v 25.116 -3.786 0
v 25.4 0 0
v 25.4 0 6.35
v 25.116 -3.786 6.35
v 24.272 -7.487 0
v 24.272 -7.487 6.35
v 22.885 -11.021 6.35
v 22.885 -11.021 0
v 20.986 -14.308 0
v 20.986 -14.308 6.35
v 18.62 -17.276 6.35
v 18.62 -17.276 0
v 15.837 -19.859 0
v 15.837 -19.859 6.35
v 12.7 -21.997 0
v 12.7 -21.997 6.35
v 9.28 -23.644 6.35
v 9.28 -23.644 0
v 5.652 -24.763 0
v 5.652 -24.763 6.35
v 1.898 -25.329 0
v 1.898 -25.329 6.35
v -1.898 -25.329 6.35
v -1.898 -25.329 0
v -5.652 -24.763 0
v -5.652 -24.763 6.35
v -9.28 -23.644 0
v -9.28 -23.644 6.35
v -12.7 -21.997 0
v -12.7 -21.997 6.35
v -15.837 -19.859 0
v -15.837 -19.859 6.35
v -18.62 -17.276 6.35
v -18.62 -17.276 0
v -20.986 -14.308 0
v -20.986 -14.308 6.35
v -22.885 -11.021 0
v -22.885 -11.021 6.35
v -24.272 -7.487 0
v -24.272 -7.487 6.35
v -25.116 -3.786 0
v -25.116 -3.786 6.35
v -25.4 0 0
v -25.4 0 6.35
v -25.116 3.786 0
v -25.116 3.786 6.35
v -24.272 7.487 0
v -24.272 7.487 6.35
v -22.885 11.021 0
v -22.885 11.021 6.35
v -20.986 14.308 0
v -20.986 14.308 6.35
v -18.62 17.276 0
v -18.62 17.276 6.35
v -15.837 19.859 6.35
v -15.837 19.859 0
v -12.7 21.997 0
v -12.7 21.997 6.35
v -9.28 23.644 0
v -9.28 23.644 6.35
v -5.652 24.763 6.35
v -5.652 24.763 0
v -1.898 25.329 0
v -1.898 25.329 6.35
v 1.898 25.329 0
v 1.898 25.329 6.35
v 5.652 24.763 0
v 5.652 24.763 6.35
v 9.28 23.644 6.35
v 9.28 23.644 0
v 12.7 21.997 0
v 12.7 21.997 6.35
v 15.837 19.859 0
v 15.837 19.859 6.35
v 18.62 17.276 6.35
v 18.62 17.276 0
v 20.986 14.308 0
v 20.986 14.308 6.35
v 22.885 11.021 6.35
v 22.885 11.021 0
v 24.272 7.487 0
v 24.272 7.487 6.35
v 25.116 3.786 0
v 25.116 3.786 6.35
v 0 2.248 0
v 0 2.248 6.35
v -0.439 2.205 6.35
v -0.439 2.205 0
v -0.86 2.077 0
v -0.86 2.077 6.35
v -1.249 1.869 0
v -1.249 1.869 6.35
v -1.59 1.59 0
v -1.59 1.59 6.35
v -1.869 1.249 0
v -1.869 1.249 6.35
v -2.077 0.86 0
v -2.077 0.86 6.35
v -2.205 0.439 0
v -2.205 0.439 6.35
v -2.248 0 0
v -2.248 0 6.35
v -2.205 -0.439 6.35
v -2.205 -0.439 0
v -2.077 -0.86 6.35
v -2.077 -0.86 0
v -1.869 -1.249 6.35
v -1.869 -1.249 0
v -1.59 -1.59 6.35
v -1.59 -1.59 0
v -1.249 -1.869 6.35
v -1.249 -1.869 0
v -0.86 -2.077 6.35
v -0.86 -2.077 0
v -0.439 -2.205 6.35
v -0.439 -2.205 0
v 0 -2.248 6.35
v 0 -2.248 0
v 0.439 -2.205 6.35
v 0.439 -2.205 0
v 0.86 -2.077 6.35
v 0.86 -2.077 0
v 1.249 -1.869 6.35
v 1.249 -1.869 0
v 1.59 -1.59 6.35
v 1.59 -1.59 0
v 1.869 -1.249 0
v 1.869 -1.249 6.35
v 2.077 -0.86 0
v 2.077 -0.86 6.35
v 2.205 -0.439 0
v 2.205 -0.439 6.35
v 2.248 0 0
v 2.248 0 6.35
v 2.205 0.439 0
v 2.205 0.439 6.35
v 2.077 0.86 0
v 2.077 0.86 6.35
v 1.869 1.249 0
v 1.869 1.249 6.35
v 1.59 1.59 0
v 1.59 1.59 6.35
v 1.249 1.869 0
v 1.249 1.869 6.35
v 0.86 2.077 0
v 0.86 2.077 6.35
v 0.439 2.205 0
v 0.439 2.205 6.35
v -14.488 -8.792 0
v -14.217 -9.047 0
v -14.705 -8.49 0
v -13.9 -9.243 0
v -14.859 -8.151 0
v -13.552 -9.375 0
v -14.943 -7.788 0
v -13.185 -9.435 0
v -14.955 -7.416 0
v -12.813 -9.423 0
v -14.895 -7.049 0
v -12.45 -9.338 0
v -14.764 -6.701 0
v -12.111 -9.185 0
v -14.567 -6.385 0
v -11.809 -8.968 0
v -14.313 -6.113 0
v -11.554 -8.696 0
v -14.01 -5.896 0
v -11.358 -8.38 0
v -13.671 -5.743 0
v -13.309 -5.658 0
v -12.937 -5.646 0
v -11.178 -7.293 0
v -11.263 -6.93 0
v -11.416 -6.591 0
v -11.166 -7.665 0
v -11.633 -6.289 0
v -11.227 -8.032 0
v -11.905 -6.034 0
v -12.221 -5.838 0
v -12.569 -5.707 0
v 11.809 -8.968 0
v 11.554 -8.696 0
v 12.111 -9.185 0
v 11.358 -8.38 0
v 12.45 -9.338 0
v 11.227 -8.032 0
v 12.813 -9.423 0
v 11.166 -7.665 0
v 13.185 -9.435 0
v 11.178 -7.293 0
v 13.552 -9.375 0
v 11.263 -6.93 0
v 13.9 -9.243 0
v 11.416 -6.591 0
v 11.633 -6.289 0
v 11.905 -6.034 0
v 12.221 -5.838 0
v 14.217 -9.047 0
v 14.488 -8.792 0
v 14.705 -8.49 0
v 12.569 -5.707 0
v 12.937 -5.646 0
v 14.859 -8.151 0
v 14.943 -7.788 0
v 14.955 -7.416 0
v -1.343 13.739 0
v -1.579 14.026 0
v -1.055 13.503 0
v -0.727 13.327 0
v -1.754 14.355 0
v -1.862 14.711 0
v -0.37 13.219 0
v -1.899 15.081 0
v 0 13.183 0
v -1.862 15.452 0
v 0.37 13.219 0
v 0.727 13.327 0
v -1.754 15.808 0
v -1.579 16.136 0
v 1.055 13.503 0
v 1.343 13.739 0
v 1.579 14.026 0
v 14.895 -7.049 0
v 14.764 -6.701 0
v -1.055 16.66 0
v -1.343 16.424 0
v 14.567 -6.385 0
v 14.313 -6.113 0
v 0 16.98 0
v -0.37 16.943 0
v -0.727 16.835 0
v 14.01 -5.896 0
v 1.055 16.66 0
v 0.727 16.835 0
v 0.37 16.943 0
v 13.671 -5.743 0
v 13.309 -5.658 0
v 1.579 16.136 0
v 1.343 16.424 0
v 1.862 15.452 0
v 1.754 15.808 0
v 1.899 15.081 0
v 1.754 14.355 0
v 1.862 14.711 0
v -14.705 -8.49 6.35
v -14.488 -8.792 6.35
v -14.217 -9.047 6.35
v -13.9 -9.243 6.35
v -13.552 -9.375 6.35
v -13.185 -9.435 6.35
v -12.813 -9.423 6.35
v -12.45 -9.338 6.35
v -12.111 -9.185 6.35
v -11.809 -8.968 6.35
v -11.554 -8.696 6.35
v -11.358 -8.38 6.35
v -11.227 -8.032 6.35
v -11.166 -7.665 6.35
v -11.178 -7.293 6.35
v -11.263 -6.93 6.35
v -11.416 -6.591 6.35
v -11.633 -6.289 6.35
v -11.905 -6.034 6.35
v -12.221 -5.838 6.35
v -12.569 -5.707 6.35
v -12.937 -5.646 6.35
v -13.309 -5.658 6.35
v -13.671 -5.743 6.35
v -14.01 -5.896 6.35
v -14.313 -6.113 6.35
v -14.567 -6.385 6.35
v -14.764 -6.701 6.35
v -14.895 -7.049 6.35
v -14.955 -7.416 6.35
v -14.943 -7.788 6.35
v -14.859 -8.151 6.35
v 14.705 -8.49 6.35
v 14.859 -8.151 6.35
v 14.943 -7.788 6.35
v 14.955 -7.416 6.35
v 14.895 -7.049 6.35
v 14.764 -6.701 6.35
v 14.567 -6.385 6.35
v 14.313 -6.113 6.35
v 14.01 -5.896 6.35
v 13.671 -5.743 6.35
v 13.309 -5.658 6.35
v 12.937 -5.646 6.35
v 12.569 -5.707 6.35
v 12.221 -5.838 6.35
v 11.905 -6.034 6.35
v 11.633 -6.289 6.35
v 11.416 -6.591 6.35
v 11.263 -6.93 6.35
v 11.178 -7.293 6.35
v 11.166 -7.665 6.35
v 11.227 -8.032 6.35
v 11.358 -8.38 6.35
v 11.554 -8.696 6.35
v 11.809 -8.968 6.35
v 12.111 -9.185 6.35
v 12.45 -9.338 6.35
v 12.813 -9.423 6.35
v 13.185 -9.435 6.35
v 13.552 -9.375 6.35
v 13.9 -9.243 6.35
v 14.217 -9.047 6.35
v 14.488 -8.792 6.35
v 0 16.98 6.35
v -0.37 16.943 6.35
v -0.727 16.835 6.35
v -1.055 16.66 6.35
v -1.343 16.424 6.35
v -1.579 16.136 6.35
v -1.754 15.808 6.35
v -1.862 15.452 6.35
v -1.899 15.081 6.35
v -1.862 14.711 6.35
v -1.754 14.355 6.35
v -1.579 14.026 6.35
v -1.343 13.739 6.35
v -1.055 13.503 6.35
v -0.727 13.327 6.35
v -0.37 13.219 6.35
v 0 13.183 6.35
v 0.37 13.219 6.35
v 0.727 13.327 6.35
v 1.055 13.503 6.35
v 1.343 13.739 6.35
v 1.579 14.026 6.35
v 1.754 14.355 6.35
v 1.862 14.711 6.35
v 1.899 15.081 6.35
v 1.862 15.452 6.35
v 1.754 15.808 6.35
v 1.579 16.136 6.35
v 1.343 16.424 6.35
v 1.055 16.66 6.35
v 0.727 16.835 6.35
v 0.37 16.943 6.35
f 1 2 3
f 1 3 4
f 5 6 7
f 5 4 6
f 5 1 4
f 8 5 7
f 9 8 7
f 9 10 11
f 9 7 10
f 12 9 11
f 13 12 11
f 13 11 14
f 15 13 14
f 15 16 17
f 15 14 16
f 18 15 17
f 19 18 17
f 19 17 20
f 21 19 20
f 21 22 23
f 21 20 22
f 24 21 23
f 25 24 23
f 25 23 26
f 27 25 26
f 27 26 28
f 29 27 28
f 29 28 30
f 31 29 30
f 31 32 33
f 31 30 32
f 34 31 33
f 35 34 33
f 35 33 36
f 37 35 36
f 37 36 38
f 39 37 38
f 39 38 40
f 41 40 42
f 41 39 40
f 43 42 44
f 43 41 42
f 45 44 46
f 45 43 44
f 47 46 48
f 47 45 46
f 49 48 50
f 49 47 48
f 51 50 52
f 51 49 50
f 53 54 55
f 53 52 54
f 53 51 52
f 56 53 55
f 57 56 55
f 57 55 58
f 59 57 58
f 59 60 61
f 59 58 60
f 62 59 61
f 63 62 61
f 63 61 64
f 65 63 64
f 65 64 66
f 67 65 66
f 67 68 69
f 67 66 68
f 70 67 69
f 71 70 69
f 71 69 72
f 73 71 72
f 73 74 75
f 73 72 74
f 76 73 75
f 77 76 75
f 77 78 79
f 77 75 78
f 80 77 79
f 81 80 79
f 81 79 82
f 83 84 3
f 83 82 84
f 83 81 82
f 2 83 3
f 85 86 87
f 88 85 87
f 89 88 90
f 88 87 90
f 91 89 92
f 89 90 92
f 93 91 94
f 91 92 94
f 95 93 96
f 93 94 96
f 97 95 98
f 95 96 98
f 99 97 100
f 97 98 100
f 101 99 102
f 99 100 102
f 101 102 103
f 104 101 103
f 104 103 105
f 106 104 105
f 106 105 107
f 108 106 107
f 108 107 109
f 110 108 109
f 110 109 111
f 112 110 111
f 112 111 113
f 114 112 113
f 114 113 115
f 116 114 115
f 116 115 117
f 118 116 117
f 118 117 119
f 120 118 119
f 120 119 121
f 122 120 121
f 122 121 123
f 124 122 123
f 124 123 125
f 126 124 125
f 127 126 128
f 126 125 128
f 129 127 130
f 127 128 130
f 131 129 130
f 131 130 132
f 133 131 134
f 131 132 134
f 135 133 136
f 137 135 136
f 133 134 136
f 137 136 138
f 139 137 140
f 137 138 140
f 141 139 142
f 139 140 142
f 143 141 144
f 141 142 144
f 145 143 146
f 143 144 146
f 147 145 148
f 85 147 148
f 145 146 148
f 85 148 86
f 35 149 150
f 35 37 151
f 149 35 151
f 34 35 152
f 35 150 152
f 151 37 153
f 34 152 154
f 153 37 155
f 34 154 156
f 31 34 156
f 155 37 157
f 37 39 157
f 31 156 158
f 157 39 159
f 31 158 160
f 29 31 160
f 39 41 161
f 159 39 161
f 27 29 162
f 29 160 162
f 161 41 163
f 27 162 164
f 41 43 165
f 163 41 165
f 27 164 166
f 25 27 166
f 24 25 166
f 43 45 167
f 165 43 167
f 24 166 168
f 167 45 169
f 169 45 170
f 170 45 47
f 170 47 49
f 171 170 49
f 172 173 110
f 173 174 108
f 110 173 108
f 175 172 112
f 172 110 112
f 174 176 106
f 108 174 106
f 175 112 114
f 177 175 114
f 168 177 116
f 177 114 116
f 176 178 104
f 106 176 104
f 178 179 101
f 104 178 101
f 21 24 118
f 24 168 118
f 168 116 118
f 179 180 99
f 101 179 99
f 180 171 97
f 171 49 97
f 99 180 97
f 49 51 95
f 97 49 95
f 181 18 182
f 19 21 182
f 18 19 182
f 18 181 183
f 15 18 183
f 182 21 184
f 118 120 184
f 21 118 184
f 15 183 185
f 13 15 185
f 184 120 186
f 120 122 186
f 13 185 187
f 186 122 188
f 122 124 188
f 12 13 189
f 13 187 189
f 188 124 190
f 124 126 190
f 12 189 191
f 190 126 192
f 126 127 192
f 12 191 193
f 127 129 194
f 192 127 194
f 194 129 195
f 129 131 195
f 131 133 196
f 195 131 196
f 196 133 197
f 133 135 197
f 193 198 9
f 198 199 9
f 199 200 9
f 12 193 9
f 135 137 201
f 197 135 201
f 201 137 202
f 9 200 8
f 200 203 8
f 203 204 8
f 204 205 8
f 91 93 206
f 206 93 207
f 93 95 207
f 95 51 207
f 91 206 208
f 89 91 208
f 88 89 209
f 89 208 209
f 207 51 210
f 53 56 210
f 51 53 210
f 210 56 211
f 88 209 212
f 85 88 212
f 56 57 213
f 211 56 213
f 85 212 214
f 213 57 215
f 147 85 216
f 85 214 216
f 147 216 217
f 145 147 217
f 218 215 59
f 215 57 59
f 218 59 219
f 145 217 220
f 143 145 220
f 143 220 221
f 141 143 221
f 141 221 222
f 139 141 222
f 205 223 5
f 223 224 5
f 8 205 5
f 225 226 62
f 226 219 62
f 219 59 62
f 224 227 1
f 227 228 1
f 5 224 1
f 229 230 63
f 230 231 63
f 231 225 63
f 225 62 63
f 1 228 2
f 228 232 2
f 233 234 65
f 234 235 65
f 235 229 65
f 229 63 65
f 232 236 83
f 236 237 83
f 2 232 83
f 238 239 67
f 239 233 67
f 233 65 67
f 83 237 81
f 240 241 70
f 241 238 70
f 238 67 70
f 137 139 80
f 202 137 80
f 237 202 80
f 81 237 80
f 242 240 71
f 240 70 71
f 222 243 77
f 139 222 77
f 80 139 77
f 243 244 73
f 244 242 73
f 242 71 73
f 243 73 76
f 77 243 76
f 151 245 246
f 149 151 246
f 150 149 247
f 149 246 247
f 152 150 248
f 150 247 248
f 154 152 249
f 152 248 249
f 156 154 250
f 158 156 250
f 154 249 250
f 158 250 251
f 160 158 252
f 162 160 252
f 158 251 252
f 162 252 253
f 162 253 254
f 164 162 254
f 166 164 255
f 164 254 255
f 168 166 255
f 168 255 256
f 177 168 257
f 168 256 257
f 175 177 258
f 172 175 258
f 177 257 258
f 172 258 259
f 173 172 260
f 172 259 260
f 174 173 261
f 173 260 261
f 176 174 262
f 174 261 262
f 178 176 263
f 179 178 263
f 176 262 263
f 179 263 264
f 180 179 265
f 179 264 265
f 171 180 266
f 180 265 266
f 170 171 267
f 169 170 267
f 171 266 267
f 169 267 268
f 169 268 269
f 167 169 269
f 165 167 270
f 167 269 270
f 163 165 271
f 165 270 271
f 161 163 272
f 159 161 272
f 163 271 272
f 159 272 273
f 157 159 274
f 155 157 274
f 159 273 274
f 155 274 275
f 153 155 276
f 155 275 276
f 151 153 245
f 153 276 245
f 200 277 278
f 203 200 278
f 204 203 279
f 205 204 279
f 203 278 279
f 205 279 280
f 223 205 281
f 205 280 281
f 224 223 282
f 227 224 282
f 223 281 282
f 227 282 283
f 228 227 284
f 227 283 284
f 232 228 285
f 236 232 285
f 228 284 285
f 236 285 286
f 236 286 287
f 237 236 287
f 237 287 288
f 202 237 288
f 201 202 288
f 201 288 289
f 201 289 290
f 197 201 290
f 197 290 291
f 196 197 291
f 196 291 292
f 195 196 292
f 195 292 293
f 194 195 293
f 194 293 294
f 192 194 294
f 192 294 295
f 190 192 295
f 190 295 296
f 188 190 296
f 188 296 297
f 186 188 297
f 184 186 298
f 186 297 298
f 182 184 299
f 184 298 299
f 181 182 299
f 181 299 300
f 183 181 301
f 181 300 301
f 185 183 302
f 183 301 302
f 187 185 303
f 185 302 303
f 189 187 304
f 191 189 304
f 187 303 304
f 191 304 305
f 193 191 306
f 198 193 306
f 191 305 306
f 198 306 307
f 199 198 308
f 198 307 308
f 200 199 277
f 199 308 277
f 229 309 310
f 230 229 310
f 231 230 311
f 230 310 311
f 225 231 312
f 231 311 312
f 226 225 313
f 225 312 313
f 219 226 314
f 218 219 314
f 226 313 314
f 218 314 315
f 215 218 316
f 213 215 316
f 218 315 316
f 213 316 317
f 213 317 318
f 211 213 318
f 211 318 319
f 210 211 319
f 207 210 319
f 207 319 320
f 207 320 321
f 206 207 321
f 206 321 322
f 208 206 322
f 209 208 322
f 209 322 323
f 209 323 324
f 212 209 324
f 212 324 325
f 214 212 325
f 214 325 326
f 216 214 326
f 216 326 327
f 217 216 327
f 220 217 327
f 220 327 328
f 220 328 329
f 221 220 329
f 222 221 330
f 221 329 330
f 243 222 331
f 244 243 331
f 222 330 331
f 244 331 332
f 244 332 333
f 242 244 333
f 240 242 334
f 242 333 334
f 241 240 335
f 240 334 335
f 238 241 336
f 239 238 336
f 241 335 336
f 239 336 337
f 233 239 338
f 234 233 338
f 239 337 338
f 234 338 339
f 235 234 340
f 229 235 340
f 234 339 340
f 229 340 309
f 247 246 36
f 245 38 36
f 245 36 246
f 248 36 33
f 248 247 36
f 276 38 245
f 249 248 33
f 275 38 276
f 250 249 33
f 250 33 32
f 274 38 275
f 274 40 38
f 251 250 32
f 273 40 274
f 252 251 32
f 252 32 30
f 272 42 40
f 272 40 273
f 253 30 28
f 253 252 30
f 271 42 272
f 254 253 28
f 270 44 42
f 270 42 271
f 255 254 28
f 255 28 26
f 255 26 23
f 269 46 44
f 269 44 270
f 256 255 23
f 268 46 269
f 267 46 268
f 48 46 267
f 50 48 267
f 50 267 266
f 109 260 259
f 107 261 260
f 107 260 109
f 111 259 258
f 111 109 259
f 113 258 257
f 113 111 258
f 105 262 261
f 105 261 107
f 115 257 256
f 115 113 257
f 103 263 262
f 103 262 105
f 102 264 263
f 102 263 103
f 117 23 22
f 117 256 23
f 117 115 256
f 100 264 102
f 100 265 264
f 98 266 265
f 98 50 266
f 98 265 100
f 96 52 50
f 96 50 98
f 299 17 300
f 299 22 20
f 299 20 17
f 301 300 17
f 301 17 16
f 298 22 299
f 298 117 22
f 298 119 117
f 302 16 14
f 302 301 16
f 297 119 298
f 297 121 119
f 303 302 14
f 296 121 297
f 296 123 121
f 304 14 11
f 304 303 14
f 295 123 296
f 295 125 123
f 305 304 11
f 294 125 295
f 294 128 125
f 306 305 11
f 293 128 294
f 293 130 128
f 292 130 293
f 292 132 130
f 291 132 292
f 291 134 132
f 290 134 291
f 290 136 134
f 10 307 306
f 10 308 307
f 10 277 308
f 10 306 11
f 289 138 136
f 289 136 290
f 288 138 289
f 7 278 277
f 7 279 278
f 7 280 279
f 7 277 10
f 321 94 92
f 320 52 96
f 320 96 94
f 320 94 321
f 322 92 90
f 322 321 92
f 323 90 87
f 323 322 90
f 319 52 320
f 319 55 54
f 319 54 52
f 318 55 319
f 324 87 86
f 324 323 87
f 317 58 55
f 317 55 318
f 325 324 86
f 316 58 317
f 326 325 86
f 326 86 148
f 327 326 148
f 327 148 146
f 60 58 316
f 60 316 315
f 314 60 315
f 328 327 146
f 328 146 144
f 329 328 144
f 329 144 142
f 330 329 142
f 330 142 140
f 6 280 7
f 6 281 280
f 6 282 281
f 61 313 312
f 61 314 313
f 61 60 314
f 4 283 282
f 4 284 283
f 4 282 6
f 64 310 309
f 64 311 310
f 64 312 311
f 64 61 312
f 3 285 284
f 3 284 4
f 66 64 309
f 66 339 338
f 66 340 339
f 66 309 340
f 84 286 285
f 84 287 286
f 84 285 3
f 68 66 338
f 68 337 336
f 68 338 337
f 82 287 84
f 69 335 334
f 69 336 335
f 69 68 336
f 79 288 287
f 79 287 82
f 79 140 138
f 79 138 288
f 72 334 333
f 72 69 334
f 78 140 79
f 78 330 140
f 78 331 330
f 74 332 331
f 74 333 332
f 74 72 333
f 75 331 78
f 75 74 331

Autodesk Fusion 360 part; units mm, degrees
sketch "Sketch1" plane through (0, 0, 0) normal (0, 0, 1) x (1, 0, 0)
  circle A0 centre (0, 0) radius 25.4
  circle A1 centre (0, 0) radius 22.225 construction
  line L0 (0, 0) -> (0, 25.4) construction
  circle A2 centre (0, 0) radius 15.0812 construction
  point P0 (0, 22.225)
  point P1 (0, 15.0812)
  dimension "d1" = 50.8
  dimension "d2" = 44.45
  dimension "d3" = 30.1625
extrude "Extrude1" add sketch "Sketch1" along normal blind 6.35
hole "Hole1" at (0, 0, 0) direction (0, 0, 1) diameter 4.4958 depth 6.35 tip angle 118
hole "Hole2" at (0, 15.0812, 0) direction (0, 0, 1) diameter 3.7973 depth 6.35 tip angle 118
pattern_circular "C-Pattern1" count 3 over 360 about axis through (0, 0, 0) along (0, 0, 1) of "Hole1"
pattern_circular "C-Pattern2" count 3 over 360 about axis through (0, 0, 0) along (0, 0, 1) of "Hole2"
hole "Hole3" at (0, 0, 0) direction (0, 0, 1) diameter 2.2708 depth 6.35 tip angle 180
